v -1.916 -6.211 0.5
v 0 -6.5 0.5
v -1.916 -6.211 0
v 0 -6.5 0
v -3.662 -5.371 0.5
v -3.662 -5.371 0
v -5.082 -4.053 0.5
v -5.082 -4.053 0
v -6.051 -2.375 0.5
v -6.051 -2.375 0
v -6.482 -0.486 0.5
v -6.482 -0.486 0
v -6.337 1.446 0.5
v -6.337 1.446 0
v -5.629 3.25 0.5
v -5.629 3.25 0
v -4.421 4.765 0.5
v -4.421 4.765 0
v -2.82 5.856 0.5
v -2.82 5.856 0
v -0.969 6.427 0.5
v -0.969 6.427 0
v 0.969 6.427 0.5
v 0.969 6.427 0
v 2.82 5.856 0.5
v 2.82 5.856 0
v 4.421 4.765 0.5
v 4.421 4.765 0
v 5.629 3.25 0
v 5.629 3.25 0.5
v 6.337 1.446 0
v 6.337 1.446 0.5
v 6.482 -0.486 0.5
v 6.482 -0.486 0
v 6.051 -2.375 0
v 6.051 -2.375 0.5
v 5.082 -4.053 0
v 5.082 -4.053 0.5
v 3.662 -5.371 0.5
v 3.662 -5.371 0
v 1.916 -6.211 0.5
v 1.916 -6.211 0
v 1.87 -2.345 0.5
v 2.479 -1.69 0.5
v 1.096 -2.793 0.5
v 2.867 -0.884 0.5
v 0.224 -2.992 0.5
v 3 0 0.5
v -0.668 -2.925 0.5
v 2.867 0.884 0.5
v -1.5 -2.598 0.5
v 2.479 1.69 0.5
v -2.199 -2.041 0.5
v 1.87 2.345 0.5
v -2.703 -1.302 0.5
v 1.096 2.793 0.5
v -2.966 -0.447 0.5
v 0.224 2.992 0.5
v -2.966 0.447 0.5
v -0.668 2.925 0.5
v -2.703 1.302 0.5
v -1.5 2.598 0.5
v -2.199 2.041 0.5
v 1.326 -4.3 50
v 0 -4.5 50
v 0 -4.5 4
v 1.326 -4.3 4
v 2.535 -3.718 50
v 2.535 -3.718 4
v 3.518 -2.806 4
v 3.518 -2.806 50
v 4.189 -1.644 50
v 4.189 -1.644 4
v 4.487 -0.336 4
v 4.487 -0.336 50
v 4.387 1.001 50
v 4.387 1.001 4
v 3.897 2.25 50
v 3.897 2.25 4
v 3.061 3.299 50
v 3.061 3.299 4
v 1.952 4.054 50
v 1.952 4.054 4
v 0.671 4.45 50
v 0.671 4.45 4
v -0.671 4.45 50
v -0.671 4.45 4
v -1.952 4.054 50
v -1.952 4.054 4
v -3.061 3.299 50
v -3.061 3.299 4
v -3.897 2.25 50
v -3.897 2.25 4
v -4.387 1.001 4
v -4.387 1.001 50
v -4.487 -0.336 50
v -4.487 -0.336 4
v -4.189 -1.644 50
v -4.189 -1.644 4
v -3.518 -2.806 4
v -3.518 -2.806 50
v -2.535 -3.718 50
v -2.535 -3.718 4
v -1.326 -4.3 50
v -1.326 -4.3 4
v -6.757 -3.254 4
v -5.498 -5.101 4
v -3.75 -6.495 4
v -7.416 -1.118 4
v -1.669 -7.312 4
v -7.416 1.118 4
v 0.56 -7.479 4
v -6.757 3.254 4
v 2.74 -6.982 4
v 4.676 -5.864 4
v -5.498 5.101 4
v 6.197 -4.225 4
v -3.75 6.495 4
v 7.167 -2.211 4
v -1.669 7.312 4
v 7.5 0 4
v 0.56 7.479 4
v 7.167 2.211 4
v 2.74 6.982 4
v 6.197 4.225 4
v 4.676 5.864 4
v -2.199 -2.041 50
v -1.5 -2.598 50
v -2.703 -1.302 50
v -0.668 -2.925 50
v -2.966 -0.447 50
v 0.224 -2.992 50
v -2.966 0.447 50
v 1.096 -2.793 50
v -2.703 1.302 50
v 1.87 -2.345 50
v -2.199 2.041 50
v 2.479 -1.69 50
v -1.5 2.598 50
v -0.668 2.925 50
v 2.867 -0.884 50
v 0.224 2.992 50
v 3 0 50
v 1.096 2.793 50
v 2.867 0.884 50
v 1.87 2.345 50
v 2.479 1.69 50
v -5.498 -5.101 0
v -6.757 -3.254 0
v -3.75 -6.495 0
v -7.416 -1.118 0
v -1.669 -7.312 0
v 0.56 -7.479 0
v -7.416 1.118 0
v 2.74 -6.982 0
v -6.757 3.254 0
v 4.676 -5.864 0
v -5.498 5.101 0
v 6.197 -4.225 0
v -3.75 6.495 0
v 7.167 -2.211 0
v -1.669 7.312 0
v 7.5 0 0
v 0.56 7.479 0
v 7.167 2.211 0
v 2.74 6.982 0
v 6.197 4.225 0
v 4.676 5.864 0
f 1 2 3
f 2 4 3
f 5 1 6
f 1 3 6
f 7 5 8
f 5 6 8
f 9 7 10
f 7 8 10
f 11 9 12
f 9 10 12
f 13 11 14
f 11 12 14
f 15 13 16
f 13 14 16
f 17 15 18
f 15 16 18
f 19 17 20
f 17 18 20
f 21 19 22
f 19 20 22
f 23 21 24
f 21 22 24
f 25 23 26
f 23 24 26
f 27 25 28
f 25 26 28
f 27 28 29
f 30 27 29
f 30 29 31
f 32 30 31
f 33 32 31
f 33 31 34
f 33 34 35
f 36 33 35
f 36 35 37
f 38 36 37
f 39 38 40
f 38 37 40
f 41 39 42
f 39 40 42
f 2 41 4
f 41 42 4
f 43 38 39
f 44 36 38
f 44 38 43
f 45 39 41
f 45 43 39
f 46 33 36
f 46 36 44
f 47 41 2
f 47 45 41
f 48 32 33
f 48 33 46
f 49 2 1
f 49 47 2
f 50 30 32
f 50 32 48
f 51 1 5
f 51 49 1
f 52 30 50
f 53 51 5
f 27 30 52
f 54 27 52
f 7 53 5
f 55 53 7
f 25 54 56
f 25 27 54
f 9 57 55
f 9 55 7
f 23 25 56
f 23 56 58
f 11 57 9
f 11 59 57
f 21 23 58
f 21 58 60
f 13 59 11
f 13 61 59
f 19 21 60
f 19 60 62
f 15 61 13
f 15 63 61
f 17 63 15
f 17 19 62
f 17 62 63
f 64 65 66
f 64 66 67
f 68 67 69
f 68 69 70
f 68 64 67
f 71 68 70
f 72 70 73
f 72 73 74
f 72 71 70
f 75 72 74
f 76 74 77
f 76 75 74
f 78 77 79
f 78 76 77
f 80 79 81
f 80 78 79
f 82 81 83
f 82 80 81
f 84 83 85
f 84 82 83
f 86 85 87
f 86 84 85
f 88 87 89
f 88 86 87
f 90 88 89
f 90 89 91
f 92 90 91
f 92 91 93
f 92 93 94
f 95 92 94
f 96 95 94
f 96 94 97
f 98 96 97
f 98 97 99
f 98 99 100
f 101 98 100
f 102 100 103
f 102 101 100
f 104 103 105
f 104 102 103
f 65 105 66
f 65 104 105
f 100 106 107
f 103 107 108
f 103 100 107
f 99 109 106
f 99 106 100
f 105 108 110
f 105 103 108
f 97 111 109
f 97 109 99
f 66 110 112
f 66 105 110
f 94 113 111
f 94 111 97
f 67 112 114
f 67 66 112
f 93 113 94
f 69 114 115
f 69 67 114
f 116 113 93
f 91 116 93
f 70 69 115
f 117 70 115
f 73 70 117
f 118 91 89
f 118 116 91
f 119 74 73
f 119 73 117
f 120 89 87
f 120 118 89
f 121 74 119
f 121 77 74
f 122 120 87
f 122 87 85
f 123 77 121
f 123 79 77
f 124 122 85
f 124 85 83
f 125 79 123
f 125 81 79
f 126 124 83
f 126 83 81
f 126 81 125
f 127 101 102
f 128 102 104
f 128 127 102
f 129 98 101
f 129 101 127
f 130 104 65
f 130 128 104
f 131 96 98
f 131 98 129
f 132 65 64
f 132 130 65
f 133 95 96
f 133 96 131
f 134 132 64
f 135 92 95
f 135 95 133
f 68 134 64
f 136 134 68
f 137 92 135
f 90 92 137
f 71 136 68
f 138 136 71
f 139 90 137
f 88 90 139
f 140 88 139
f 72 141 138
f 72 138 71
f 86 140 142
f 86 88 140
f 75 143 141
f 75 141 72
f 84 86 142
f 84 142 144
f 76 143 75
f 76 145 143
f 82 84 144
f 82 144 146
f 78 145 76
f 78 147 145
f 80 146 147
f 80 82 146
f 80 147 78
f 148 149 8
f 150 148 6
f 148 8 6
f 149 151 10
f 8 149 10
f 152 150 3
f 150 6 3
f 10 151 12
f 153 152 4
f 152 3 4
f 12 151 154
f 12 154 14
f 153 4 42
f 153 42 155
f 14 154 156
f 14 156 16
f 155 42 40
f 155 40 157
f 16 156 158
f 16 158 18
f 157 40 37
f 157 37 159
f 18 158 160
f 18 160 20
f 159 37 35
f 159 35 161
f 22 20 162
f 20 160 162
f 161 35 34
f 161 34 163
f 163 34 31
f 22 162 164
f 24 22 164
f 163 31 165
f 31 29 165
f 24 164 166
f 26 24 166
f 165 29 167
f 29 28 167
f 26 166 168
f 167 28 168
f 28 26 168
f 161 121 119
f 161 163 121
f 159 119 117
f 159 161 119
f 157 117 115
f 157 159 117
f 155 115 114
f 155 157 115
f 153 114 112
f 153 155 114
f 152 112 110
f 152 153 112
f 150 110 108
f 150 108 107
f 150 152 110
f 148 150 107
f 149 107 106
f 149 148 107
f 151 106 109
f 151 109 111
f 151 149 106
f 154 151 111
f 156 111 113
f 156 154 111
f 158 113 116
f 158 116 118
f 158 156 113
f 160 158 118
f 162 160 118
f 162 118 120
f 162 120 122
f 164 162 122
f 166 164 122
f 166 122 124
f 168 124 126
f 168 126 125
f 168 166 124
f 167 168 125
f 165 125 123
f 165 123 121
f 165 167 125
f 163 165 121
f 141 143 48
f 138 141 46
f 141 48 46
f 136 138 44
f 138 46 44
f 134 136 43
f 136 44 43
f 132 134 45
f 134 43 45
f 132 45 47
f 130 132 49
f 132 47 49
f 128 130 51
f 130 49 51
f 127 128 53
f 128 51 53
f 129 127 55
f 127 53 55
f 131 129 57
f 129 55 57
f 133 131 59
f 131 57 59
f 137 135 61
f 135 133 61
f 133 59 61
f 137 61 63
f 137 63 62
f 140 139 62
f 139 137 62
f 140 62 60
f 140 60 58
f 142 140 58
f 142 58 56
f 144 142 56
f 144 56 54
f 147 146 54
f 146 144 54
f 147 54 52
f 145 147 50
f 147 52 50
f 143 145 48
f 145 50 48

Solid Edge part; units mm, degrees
sketch "Sketch1" plane through (0, 0, 0) normal (0, 0, 1) x (1, 0, 0)
  circle A0 centre (0, 0) radius 7.5
  circle A1 centre (0, 0) radius 3
extrude "Protrusion1" add sketch "Sketch1" along normal blind 50
sketch "Sketch2" plane through (0, 0, 50) normal (0, 0, 1) x (0, -1, 0)
  circle A0 centre (0, 0) radius 4.5
  circle A1 centre (0, 0) radius 7.5
extrude "ExtrudedCutout_1" cut sketch "Sketch2" against normal blind 46
sketch "Sketch3" plane through (0, 0, 0) normal (0, 0, -1) x (0, -1, 0)
  circle A0 centre (0, 0) radius 6.5
extrude "ExtrudedCutout_2" cut sketch "Sketch3" against normal blind 0.5
